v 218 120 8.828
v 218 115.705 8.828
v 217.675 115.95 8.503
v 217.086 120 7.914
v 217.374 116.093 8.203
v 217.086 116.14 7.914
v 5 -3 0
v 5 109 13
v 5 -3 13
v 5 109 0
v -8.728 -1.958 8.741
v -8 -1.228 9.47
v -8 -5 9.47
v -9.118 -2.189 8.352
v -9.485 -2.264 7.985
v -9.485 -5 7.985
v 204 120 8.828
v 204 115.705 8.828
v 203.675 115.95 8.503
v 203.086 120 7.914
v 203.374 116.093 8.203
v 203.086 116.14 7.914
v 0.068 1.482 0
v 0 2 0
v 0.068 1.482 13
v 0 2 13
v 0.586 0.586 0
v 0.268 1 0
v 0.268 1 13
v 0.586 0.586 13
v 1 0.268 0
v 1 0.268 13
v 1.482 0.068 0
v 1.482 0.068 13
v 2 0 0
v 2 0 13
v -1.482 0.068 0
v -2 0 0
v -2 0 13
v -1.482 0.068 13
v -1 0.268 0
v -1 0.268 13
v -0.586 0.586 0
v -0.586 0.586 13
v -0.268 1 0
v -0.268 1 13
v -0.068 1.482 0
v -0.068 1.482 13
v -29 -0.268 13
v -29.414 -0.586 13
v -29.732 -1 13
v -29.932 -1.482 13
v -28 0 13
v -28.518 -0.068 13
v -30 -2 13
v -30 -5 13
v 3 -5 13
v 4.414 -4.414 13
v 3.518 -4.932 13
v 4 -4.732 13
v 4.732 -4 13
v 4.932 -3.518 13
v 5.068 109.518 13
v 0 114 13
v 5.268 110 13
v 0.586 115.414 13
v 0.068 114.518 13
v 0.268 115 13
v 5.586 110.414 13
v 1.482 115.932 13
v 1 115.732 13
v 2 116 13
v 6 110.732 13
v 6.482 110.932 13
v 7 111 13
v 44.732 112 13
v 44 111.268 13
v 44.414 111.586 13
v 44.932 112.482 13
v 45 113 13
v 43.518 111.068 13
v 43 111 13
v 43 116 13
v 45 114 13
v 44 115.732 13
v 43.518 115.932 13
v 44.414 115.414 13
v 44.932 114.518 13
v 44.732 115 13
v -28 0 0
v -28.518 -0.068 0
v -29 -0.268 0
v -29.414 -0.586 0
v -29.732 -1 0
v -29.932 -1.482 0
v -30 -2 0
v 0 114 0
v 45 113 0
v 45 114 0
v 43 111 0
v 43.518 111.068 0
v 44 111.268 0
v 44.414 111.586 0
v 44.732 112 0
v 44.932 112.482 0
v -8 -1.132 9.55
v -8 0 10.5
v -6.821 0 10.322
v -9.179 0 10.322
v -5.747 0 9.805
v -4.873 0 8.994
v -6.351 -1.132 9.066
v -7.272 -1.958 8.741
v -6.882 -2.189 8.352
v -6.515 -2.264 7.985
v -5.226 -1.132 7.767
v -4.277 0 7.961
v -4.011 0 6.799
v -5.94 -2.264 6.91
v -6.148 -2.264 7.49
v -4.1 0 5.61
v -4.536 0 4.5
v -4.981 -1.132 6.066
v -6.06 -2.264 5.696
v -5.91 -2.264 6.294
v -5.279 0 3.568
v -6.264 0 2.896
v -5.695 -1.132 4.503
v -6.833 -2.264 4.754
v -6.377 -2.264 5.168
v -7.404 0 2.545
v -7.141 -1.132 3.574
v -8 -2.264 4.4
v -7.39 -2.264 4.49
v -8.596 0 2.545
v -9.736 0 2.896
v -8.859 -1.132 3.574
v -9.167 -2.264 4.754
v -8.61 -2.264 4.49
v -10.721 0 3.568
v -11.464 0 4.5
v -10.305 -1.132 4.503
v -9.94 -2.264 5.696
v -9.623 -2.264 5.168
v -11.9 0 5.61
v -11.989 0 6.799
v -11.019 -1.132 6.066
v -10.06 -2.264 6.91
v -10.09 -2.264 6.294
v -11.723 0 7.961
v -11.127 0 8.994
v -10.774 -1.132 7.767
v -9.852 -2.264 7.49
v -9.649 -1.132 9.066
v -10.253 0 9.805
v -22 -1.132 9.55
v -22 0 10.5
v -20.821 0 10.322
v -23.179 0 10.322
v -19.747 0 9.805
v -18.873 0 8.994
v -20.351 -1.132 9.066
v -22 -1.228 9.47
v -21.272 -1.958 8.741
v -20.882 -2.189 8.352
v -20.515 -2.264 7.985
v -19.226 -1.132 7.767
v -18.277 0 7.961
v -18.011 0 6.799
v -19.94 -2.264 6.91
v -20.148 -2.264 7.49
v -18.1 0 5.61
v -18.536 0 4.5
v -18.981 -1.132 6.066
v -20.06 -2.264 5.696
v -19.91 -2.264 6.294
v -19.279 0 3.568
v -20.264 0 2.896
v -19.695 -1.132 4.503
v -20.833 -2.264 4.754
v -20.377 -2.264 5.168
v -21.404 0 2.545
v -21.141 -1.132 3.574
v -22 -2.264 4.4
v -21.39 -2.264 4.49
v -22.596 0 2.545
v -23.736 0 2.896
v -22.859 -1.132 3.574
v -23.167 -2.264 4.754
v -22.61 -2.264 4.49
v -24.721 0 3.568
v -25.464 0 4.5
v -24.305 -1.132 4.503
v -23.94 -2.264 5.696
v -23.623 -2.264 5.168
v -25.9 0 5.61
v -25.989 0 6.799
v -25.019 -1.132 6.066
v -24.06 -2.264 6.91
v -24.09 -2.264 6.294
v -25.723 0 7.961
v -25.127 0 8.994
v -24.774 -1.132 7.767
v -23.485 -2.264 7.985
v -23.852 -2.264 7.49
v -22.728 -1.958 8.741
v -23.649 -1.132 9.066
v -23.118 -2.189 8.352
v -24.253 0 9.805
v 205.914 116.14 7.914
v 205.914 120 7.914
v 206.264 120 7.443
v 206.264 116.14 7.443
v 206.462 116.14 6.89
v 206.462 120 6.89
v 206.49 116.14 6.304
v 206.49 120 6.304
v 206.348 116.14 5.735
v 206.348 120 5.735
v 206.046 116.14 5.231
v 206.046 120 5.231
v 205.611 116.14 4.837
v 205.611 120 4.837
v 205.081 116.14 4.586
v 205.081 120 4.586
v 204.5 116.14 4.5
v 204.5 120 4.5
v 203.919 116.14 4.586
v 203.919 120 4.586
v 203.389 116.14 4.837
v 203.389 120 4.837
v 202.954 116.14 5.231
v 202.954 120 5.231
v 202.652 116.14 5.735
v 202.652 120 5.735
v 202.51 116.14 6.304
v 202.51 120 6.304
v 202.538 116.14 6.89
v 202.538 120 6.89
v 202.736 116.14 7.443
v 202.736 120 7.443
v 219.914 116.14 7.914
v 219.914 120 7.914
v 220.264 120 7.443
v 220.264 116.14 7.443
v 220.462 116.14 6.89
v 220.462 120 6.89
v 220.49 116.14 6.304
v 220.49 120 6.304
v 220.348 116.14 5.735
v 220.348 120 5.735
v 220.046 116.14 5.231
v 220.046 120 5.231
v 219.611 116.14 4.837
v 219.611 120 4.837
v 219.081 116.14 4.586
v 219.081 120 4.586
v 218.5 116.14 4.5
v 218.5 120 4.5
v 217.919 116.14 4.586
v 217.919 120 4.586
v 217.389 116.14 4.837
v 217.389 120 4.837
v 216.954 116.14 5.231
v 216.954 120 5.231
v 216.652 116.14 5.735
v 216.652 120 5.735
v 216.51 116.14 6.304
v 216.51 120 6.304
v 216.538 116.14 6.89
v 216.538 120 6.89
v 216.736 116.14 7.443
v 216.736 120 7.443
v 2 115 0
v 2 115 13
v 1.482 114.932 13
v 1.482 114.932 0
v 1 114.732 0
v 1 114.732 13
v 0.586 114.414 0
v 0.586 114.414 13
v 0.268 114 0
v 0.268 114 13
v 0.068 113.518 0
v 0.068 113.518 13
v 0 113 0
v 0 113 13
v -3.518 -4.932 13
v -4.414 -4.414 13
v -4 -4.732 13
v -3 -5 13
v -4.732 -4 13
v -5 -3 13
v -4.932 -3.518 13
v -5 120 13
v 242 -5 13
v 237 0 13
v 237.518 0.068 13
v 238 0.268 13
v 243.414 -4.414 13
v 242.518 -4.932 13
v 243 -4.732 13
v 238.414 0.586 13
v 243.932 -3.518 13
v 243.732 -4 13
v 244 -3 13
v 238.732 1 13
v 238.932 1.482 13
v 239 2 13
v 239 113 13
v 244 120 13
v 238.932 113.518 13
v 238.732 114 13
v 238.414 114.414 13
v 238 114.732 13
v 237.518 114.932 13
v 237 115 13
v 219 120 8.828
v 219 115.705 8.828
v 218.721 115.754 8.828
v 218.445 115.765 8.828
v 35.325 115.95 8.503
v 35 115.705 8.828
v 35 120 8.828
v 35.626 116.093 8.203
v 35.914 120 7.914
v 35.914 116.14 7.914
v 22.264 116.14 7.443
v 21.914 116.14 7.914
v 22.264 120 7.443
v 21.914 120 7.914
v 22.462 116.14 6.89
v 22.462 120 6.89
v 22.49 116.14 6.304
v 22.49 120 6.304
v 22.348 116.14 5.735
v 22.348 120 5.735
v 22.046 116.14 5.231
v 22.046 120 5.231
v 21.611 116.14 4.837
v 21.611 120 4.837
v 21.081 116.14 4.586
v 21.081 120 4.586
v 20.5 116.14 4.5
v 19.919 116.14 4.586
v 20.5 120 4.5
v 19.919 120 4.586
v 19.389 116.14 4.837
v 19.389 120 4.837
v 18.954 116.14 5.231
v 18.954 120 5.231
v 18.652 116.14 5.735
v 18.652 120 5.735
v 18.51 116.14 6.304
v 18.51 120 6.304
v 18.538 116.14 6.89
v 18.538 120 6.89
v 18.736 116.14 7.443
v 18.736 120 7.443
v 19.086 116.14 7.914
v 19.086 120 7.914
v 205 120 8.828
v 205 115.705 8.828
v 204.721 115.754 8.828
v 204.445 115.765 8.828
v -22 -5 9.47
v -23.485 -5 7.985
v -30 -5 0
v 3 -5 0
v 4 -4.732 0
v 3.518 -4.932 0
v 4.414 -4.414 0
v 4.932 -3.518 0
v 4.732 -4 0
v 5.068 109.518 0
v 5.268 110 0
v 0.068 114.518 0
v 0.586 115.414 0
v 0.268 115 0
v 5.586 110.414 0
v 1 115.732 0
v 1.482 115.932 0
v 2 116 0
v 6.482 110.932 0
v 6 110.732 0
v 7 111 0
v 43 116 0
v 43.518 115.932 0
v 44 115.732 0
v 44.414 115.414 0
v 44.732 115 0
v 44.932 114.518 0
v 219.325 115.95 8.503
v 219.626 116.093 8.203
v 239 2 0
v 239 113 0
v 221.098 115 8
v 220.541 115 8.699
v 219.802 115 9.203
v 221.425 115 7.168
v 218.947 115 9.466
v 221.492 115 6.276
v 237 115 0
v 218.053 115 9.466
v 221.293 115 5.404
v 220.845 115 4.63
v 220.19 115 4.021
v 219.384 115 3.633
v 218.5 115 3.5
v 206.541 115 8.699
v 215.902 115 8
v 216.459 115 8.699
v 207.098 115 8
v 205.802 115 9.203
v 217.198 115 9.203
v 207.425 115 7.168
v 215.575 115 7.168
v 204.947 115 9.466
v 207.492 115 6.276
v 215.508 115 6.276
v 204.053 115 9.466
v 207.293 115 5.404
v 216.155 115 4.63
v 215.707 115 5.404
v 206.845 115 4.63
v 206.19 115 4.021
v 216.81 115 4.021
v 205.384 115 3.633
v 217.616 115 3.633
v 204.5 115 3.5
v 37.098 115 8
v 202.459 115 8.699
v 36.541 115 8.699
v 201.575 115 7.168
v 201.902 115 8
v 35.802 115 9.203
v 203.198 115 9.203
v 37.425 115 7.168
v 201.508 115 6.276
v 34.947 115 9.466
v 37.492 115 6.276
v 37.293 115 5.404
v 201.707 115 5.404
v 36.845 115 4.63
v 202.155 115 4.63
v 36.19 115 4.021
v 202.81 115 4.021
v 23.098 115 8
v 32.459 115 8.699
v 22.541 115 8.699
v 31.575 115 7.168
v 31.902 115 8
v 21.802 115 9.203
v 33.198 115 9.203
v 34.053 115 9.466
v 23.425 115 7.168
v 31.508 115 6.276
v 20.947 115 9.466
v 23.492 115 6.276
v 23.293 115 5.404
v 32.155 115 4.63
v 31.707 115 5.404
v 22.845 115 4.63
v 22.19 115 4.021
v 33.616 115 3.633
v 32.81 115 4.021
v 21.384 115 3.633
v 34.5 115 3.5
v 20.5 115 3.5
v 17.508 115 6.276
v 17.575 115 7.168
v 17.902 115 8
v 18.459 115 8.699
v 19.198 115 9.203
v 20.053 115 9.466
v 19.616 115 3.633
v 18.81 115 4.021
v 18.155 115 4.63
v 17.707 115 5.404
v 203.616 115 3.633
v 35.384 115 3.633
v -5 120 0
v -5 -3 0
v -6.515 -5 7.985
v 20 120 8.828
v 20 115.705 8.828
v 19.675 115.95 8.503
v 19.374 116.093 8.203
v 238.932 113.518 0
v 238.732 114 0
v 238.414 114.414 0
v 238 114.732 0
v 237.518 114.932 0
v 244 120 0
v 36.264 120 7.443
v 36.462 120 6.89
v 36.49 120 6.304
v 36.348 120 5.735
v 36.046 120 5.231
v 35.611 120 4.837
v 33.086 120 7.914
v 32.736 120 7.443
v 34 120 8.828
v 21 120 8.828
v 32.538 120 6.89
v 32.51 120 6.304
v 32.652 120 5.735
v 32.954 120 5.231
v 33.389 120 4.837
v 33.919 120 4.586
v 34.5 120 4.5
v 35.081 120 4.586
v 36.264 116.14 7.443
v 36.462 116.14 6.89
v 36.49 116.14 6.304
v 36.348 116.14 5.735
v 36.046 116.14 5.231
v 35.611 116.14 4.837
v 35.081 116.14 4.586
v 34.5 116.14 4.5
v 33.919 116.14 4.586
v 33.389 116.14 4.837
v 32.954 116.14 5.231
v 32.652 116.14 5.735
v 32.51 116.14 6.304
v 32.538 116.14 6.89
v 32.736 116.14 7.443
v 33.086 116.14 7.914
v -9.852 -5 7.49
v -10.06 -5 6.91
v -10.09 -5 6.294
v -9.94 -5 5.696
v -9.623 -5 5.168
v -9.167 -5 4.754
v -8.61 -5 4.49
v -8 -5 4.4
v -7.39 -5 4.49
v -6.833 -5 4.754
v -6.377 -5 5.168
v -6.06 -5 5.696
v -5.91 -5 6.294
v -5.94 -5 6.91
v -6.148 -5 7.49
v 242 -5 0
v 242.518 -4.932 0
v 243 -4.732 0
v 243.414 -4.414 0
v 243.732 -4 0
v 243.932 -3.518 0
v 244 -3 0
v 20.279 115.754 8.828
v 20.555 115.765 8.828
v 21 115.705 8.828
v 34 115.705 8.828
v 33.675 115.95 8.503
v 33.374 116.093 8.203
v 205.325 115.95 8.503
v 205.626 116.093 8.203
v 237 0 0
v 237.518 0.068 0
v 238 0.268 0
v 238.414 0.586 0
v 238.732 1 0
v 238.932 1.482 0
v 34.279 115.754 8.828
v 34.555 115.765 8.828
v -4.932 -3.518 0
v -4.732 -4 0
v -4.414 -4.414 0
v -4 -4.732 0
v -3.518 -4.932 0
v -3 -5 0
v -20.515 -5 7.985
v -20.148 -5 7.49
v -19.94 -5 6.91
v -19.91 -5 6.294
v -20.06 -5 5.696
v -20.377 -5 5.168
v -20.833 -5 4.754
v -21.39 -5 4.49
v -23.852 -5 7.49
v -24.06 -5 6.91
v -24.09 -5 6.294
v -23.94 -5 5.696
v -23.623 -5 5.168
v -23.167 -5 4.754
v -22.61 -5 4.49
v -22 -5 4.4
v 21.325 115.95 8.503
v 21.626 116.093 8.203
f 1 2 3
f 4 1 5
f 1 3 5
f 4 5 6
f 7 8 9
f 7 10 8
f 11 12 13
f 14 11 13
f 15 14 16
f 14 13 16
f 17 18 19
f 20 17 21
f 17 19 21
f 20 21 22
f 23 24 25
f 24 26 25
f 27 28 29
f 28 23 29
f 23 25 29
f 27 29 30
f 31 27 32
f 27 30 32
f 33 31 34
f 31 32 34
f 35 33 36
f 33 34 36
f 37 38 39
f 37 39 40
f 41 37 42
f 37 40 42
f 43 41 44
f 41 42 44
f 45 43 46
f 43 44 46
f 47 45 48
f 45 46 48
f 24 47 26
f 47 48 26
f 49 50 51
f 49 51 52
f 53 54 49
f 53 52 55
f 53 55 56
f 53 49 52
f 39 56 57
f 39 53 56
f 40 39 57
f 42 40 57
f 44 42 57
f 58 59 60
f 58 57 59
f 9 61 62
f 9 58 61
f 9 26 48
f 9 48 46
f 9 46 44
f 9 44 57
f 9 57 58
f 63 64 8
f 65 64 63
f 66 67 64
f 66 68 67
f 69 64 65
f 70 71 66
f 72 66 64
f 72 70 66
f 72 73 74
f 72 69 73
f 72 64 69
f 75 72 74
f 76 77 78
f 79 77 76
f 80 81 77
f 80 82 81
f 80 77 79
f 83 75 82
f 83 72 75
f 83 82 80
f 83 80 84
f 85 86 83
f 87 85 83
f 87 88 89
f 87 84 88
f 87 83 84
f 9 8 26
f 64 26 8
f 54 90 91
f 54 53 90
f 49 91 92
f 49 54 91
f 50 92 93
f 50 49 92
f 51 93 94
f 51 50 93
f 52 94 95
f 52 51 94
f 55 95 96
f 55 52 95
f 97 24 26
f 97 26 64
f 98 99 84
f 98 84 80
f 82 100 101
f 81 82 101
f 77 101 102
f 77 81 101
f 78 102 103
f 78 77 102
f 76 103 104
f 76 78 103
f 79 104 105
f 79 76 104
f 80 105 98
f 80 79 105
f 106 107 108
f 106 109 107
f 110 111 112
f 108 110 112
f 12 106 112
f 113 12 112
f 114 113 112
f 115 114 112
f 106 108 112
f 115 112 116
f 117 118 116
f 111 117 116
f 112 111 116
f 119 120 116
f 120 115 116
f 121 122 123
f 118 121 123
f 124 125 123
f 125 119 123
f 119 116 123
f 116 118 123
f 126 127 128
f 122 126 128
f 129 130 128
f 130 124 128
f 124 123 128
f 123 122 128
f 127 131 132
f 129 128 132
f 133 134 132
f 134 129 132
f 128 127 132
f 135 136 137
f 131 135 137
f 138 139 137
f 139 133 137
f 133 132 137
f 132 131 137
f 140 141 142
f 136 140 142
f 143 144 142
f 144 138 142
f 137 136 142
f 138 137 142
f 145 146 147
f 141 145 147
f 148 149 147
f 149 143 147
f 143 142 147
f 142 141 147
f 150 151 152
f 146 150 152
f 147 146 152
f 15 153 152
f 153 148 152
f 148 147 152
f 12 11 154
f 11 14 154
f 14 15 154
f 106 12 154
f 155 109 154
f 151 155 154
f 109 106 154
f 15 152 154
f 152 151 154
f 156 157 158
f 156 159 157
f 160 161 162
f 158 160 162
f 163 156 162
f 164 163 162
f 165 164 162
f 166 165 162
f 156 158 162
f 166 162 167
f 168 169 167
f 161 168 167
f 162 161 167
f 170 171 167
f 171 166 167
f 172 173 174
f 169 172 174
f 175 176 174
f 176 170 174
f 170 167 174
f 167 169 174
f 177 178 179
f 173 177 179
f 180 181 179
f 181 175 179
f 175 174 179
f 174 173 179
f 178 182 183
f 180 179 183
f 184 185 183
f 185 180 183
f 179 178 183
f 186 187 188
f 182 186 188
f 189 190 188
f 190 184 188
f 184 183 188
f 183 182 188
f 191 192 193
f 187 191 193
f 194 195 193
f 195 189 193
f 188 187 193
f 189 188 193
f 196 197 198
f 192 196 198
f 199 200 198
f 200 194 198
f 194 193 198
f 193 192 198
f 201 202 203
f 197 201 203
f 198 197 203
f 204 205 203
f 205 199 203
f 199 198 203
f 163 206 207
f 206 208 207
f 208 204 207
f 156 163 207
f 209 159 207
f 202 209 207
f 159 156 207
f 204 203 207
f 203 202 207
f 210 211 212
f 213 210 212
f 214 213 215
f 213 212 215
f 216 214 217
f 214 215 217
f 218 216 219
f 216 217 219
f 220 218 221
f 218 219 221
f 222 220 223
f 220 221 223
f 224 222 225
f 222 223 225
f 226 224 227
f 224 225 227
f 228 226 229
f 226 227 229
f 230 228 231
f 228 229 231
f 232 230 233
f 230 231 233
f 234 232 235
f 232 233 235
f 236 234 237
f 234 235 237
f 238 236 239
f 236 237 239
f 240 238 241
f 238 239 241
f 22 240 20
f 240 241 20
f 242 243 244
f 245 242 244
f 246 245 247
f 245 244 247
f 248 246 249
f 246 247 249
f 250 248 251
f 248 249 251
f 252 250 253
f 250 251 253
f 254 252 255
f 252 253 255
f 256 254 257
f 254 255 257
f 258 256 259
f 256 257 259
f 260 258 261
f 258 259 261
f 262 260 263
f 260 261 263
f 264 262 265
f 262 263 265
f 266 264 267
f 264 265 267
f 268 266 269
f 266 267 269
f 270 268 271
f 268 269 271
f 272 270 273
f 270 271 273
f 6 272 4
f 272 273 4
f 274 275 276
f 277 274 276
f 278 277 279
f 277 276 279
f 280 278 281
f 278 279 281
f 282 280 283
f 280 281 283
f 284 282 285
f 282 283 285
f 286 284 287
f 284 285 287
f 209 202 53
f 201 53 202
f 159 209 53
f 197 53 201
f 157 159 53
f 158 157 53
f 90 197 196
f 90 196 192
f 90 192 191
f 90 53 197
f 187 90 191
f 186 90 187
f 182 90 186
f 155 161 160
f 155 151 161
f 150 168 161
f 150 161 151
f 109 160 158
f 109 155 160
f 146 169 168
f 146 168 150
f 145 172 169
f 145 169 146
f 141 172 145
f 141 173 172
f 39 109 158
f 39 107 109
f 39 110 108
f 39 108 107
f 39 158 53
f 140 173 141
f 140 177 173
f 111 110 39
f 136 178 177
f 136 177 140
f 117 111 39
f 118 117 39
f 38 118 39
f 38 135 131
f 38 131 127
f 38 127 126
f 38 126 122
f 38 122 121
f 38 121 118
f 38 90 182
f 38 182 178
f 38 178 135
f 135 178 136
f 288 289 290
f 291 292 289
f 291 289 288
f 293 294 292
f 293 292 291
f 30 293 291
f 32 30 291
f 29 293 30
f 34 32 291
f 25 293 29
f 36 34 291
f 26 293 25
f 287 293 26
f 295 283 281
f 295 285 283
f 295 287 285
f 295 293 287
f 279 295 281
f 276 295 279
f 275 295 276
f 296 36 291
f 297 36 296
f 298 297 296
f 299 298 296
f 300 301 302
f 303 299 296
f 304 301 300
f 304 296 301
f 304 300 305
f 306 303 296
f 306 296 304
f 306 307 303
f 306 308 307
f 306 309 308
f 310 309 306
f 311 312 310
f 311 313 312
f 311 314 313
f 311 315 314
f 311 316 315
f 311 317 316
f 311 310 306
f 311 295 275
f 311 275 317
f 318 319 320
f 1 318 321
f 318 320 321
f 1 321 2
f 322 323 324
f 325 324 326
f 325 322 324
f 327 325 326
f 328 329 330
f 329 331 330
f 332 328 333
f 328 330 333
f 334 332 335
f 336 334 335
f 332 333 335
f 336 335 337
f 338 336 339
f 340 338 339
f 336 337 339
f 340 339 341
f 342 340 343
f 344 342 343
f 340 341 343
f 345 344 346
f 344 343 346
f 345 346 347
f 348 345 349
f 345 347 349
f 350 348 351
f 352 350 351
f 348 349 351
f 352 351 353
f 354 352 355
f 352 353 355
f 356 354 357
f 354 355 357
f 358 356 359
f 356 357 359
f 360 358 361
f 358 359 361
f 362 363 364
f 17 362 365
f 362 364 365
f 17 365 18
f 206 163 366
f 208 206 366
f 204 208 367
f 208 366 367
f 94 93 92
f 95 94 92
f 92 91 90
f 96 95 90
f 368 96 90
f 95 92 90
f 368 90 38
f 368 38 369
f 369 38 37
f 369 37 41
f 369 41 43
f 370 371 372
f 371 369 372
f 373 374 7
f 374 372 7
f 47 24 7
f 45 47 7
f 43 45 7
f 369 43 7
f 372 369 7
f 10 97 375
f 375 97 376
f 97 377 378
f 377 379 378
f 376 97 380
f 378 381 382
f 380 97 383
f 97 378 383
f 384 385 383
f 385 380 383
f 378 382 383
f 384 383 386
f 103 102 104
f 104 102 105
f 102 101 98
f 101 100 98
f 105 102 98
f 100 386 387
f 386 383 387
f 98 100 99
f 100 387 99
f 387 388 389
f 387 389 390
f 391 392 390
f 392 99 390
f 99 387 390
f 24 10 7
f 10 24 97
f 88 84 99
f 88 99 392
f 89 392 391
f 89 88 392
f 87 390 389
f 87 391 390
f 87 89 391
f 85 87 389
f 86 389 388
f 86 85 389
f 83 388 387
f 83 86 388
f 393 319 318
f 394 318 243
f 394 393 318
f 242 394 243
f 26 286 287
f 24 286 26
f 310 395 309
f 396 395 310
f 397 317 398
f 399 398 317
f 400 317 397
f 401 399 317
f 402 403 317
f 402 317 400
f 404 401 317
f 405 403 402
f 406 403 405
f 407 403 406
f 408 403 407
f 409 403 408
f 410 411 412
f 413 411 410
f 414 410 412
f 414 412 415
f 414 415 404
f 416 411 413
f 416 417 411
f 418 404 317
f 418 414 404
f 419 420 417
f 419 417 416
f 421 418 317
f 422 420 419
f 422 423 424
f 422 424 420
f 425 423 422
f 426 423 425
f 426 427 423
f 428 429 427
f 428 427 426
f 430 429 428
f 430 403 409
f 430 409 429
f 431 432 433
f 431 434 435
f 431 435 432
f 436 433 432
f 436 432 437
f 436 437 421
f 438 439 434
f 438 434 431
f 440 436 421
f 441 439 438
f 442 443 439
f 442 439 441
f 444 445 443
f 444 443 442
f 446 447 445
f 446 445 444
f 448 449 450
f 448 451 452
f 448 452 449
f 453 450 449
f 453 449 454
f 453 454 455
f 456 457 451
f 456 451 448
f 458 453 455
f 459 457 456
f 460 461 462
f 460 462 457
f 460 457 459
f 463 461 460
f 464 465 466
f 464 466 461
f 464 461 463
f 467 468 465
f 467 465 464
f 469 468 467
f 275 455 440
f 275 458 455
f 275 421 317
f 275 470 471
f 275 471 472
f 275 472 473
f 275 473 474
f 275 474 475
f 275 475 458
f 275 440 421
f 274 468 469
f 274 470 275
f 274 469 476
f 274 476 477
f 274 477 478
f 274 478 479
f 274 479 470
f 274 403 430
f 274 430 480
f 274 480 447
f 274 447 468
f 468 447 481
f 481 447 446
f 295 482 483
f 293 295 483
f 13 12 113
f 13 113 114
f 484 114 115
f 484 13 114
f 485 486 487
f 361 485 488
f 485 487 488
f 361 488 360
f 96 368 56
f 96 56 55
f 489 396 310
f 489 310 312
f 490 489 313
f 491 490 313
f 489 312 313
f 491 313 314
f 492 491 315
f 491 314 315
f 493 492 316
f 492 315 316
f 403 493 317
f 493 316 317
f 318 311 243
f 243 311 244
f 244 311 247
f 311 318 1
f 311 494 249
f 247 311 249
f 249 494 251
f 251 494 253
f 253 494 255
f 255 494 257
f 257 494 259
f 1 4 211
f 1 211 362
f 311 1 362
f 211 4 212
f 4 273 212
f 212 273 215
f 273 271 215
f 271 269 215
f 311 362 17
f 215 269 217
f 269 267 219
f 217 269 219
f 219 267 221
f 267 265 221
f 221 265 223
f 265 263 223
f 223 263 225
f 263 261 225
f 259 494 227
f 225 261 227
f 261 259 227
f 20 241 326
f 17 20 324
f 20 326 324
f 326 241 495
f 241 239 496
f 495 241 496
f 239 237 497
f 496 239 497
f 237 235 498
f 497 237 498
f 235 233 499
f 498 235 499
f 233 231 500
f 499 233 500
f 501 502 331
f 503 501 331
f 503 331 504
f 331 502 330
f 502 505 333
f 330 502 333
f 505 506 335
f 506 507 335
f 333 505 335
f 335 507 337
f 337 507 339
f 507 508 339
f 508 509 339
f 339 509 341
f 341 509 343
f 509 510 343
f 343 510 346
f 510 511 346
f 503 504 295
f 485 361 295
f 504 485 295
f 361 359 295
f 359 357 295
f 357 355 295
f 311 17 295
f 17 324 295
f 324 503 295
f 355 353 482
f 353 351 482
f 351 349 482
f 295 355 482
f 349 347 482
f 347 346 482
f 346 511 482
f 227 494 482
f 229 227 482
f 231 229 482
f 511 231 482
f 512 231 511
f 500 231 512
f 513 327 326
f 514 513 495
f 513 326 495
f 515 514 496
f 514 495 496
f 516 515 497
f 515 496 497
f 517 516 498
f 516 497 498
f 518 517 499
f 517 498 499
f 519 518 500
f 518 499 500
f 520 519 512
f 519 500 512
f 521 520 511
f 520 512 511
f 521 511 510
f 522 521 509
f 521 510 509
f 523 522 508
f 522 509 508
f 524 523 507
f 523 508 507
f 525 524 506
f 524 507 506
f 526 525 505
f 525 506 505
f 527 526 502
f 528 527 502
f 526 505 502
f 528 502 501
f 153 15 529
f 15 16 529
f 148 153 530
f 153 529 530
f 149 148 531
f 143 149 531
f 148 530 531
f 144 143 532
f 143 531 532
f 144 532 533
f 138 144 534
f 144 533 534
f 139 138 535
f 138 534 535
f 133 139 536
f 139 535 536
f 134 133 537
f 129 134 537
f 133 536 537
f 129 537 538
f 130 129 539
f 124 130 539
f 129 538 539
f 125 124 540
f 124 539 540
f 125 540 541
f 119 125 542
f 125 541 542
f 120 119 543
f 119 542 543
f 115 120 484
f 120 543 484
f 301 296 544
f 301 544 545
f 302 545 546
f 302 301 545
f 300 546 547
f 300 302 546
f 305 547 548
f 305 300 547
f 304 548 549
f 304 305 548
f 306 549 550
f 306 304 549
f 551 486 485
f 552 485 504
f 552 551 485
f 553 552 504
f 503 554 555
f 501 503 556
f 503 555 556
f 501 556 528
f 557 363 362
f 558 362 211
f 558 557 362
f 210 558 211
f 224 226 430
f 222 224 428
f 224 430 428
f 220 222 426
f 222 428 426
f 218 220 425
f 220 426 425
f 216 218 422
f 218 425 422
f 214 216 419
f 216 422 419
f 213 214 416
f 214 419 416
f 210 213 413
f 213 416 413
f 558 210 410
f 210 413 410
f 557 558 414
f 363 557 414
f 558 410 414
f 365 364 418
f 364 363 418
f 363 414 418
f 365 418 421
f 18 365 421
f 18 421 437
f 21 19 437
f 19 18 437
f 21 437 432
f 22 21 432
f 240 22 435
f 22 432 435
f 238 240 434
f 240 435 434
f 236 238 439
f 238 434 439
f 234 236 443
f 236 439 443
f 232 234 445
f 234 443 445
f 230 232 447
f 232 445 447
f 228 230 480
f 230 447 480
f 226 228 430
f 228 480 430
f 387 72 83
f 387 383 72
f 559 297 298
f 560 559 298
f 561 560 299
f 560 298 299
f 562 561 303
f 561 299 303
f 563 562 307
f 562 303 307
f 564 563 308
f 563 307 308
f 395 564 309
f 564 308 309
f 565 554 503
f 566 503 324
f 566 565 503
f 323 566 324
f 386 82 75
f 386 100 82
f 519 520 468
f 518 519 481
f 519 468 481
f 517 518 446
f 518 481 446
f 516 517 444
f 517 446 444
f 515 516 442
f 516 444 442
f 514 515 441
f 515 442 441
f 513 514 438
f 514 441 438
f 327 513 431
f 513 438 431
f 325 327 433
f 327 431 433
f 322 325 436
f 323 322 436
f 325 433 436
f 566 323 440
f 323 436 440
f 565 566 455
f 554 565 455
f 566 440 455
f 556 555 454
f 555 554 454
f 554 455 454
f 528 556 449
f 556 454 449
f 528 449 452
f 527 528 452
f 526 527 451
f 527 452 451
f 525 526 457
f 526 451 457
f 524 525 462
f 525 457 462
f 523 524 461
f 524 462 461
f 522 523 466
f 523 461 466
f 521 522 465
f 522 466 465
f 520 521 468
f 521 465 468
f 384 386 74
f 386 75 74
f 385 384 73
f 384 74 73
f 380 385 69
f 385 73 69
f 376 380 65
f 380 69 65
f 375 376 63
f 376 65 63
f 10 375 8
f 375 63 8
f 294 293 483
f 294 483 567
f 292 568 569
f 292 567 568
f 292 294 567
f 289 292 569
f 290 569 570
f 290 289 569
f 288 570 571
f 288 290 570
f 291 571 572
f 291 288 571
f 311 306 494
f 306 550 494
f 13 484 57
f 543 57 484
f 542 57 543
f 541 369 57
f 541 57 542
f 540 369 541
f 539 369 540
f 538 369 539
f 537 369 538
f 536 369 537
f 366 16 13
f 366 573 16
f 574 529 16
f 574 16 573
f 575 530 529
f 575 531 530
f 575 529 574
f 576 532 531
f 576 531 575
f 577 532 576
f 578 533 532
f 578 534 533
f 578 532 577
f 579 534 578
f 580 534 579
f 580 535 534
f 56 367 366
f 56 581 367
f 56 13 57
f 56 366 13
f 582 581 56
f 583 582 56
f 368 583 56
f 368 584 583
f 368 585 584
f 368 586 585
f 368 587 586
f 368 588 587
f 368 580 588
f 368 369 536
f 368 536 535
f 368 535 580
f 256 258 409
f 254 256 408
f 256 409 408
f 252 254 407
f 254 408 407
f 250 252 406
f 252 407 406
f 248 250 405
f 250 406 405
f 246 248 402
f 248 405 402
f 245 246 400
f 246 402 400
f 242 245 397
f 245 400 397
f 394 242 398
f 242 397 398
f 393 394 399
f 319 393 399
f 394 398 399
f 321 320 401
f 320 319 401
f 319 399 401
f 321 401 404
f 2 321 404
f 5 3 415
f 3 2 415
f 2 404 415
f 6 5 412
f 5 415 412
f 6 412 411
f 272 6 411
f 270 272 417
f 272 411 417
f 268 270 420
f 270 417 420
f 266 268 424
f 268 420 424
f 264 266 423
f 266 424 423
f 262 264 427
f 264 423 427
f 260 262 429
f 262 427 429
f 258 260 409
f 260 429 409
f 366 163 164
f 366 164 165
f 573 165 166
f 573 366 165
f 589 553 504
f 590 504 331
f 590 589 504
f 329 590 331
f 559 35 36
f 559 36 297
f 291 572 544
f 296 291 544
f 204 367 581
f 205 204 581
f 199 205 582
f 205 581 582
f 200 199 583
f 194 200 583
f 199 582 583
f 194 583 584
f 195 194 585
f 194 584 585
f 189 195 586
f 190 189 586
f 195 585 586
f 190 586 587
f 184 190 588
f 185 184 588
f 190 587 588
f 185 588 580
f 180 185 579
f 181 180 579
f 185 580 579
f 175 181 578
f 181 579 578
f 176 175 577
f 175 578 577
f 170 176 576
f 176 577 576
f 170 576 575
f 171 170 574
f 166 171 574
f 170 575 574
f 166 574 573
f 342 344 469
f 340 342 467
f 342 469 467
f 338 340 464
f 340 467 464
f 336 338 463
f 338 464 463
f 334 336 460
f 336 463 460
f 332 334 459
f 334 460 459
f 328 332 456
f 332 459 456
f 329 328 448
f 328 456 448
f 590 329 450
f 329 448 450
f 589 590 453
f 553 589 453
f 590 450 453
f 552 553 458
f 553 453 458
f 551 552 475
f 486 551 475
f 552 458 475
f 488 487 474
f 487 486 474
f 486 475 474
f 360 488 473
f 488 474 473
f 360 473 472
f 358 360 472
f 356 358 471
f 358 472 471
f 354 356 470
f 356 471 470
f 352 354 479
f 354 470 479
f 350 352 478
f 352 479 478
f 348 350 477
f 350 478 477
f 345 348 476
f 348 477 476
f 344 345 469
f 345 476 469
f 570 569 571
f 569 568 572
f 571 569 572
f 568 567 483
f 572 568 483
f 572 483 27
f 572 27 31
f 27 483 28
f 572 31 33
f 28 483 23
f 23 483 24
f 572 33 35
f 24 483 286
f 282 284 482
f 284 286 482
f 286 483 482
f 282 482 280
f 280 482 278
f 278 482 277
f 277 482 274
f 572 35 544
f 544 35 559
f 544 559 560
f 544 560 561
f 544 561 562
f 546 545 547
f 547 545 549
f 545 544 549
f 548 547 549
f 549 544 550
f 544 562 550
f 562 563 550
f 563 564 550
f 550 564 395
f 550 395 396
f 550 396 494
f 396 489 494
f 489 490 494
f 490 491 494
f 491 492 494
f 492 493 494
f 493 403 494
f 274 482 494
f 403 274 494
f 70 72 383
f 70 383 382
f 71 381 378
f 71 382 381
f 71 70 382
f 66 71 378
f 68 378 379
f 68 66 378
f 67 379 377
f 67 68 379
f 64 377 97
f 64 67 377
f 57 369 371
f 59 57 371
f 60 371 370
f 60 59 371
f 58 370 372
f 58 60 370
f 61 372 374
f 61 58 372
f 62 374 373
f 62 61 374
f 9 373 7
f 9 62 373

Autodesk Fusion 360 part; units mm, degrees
sketch "Sketch1" plane through (0, 0, 0) normal (0, 0, 1) x (1, 0, 0)
  line L0 (0, 0) -> (0, 116)
  line L1 (0, 116) -> (45, 116)
  line L2 (45, 116) -> (45, 111)
  line L3 (45, 111) -> (5, 111)
  line L4 (5, 111) -> (5, -5)
  line L5 (5, -5) -> (-30, -5)
  line L6 (-30, -5) -> (-30, 0)
  line L7 (-30, 0) -> (0, 0)
  dimension "d1" = 116
  dimension "d2" = 5
  dimension "d3" = 5
  dimension "d4" = 40
  dimension "d5" = 5
  dimension "d6" = 30
extrude "Extrude1" add sketch "Sketch1" along normal blind 13 makes body 1
sketch "Sketch2" plane through (0, 0, 0) normal (0, 1, 0) x (-1, 0, 0)
  line L0 (0, 0) -> (30, 0)
  line L1 (30, 0) -> (30, 13)
  line L2 (30, 13) -> (0, 13)
  line L3 (0, 13) -> (0, 0)
  line L4 (30, 6.5) -> (0, 6.5) construction
  line L5 (15, 6.5) -> (15, 0) construction
  point P0 (8, 6.5)
  point P1 (22, 6.5)
  dimension "d9" = 14
  dimension "d10" = 8
hole "Hole1" at (-22, 0, 6.5) at (-8, 0, 6.5) direction (0, -1, 0) diameter 4.2 depth 5 tip angle 180 countersink diameter 8 countersink angle 80 bodies 1
fillet "Fillet1" radius 2 7 edges at (-30, 0, 6.5) (0, 0, 6.5) (0, 116, 6.5) (45, 116, 6.5) (5, 111, 6.5) (45, 111, 6.5) (5, -5, 6.5) on bodies 1
sketch "Sketch3" plane through (0, -5, 0) normal (0, -1, 0) x (1, 0, 0)
  line L0 (3, 0) -> (3, 13)
  line L1 (3, 13) -> (-30, 13)
  line L2 (-30, 13) -> (-30, 0)
  line L3 (-30, 0) -> (3, 0)
  circle A0 centre (-8, 6.5) radius 2.1
  circle A1 centre (-22, 6.5) radius 2.1
  circle A2 centre (-22, 6.5) radius 2.1
  circle A3 centre (-8, 6.5) radius 2.1
  line L4 (-22, 6.5) -> (-22, 6.8101)
  line L5 (-22, 6.8101) -> (-22, 9.4698) construction
  line L6 (-22, 9.4698) -> (-20.5151, 7.9849)
  line L7 (-22, 9.4698) -> (-23.4849, 7.9849)
  line L8 (-8, 6.5) -> (-8, 6.7678) construction
  line L9 (-8, 6.7678) -> (-8, 9.4698) construction
  line L10 (-8, 9.4698) -> (-6.5151, 7.9849)
  line L11 (-8, 9.4698) -> (-9.4849, 7.9849)
extrude "Extrude2" cut sketch "Sketch3" against normal blind 5 contours A0 A3 L10 L11 | A1 A2 L6 L7 bodies 1
copy_body "Body->Comp1" bodies 1 removing the originals makes body 2 in component "Cat Water Bowl anti-tip bracket"
sketch "Base Sketch" plane through (0, 0, 0) normal (0, 0, 1) x (1, 0, 0) in component "v2 Anti-tip Bracket"
  line L0 (0, 0) -> (239, 0)
  line L1 (239, 0) -> (239, 115)
  line L2 (239, 115) -> (0, 115)
  line L3 (0, 115) -> (0, 0)
  line L4 (244, -5) -> (244, 120)
  line L5 (244, 120) -> (-5, 120)
  line L6 (-5, 120) -> (-5, -5)
  line L7 (-5, -5) -> (244, -5)
  dimension "d21" = 239
  dimension "d22" = 115
  dimension "d23" = 5
  dimension "d41" = 249
extrude "Extrude1'" add sketch "Base Sketch" along normal blind 13 separate body makes body 3 in component "v2 Anti-tip Bracket"
sketch "Hole positions and Teardrops" plane through (0, 115, 0) normal (0, -1, 0) x (1, 0, 0) in component "v2 Anti-tip Bracket"
  line L0 (0, 0) -> (239, 0)
  line L1 (239, 0) -> (239, 13)
  line L2 (239, 13) -> (0, 13)
  line L3 (0, 13) -> (0, 0)
  line L4 (-5, 0) -> (244, 0)
  line L5 (244, 0) -> (244, 13)
  line L6 (244, 13) -> (-5, 13)
  line L7 (-5, 13) -> (-5, 0)
  line L8 (119.5, 13) -> (119.5, 32.1039) construction
  circle A0 centre (20.5, 6.5) radius 2
  circle A1 centre (34.5, 6.5) radius 2
  line L9 (-5, 6.5) -> (34.5, 6.5) construction
  circle A2 centre (218.5, 6.5) radius 2
  circle A3 centre (204.5, 6.5) radius 2
  line L10 (218.5, 9.3284) -> (217.0858, 7.9142)
  line L11 (218.5, 6.5) -> (218.5, 9.3284) construction
  line L12 (218.5, 9.3284) -> (219.9142, 7.9142)
  line L13 (219, 8.8284) -> (218, 8.8284)
  line L14 (204.5, 6.5) -> (204.5, 9.3284) construction
  line L15 (204.5, 9.3284) -> (205.9142, 7.9142)
  line L16 (204.5, 9.3284) -> (203.0858, 7.9142)
  line L17 (205, 8.8284) -> (204, 8.8284)
  line L18 (20.5, 9.3284) -> (21.9142, 7.9142)
  line L19 (20, 8.8284) -> (21, 8.8284)
  line L20 (20.5, 9.3284) -> (19.0858, 7.9142)
  line L21 (34.5, 9.3284) -> (33.0858, 7.9142)
  line L22 (34, 8.8284) -> (35, 8.8284)
  line L23 (34.5, 9.3284) -> (35.9142, 7.9142)
  dimension "d26" = 4
  dimension "d27" = 14
  dimension "d28" = 85
  dimension "d36" = 1
  dimension "d38" = 1
hole "Hole1'" at (34.5, 115, 6.5) at (20.5, 115, 6.5) at (218.5, 115, 6.5) at (204.5, 115, 6.5) direction (0, 1, 0) diameter 4 depth 5 tip angle 118 countersink diameter 6 countersink angle 82.5 bodies 3 in component "v2 Anti-tip Bracket"
fillet "Fillet1'" radius 2 6 edges at (0, 115, 6.5) (239, 115, 6.5) (239, 0, 6.5) (0, 0, 6.5) (244, -5, 6.5) (-5, -5, 6.5) on bodies 3 in component "v2 Anti-tip Bracket"
extrude "Extrude2'" cut sketch "Hole positions and Teardrops" against normal blind 5 contours A0 L18 L19 L20 | A1 L21 L22 L23 | A2 L10 L12 L13 | A3 L15 L16 L17 bodies 3 in component "v2 Anti-tip Bracket"
component "Cat Water Bowl anti-tip bracket" placed x (1, 0, 0) y (0, 1, 0) z (0, 0, 1) at (0, 0, 0)
component "v2 Anti-tip Bracket" placed x (1, 0, 0) y (0, 1, 0) z (0, 0, 1) at (0, 0, 0)
equation "d3 = d2"
equation "d5 = d2"
